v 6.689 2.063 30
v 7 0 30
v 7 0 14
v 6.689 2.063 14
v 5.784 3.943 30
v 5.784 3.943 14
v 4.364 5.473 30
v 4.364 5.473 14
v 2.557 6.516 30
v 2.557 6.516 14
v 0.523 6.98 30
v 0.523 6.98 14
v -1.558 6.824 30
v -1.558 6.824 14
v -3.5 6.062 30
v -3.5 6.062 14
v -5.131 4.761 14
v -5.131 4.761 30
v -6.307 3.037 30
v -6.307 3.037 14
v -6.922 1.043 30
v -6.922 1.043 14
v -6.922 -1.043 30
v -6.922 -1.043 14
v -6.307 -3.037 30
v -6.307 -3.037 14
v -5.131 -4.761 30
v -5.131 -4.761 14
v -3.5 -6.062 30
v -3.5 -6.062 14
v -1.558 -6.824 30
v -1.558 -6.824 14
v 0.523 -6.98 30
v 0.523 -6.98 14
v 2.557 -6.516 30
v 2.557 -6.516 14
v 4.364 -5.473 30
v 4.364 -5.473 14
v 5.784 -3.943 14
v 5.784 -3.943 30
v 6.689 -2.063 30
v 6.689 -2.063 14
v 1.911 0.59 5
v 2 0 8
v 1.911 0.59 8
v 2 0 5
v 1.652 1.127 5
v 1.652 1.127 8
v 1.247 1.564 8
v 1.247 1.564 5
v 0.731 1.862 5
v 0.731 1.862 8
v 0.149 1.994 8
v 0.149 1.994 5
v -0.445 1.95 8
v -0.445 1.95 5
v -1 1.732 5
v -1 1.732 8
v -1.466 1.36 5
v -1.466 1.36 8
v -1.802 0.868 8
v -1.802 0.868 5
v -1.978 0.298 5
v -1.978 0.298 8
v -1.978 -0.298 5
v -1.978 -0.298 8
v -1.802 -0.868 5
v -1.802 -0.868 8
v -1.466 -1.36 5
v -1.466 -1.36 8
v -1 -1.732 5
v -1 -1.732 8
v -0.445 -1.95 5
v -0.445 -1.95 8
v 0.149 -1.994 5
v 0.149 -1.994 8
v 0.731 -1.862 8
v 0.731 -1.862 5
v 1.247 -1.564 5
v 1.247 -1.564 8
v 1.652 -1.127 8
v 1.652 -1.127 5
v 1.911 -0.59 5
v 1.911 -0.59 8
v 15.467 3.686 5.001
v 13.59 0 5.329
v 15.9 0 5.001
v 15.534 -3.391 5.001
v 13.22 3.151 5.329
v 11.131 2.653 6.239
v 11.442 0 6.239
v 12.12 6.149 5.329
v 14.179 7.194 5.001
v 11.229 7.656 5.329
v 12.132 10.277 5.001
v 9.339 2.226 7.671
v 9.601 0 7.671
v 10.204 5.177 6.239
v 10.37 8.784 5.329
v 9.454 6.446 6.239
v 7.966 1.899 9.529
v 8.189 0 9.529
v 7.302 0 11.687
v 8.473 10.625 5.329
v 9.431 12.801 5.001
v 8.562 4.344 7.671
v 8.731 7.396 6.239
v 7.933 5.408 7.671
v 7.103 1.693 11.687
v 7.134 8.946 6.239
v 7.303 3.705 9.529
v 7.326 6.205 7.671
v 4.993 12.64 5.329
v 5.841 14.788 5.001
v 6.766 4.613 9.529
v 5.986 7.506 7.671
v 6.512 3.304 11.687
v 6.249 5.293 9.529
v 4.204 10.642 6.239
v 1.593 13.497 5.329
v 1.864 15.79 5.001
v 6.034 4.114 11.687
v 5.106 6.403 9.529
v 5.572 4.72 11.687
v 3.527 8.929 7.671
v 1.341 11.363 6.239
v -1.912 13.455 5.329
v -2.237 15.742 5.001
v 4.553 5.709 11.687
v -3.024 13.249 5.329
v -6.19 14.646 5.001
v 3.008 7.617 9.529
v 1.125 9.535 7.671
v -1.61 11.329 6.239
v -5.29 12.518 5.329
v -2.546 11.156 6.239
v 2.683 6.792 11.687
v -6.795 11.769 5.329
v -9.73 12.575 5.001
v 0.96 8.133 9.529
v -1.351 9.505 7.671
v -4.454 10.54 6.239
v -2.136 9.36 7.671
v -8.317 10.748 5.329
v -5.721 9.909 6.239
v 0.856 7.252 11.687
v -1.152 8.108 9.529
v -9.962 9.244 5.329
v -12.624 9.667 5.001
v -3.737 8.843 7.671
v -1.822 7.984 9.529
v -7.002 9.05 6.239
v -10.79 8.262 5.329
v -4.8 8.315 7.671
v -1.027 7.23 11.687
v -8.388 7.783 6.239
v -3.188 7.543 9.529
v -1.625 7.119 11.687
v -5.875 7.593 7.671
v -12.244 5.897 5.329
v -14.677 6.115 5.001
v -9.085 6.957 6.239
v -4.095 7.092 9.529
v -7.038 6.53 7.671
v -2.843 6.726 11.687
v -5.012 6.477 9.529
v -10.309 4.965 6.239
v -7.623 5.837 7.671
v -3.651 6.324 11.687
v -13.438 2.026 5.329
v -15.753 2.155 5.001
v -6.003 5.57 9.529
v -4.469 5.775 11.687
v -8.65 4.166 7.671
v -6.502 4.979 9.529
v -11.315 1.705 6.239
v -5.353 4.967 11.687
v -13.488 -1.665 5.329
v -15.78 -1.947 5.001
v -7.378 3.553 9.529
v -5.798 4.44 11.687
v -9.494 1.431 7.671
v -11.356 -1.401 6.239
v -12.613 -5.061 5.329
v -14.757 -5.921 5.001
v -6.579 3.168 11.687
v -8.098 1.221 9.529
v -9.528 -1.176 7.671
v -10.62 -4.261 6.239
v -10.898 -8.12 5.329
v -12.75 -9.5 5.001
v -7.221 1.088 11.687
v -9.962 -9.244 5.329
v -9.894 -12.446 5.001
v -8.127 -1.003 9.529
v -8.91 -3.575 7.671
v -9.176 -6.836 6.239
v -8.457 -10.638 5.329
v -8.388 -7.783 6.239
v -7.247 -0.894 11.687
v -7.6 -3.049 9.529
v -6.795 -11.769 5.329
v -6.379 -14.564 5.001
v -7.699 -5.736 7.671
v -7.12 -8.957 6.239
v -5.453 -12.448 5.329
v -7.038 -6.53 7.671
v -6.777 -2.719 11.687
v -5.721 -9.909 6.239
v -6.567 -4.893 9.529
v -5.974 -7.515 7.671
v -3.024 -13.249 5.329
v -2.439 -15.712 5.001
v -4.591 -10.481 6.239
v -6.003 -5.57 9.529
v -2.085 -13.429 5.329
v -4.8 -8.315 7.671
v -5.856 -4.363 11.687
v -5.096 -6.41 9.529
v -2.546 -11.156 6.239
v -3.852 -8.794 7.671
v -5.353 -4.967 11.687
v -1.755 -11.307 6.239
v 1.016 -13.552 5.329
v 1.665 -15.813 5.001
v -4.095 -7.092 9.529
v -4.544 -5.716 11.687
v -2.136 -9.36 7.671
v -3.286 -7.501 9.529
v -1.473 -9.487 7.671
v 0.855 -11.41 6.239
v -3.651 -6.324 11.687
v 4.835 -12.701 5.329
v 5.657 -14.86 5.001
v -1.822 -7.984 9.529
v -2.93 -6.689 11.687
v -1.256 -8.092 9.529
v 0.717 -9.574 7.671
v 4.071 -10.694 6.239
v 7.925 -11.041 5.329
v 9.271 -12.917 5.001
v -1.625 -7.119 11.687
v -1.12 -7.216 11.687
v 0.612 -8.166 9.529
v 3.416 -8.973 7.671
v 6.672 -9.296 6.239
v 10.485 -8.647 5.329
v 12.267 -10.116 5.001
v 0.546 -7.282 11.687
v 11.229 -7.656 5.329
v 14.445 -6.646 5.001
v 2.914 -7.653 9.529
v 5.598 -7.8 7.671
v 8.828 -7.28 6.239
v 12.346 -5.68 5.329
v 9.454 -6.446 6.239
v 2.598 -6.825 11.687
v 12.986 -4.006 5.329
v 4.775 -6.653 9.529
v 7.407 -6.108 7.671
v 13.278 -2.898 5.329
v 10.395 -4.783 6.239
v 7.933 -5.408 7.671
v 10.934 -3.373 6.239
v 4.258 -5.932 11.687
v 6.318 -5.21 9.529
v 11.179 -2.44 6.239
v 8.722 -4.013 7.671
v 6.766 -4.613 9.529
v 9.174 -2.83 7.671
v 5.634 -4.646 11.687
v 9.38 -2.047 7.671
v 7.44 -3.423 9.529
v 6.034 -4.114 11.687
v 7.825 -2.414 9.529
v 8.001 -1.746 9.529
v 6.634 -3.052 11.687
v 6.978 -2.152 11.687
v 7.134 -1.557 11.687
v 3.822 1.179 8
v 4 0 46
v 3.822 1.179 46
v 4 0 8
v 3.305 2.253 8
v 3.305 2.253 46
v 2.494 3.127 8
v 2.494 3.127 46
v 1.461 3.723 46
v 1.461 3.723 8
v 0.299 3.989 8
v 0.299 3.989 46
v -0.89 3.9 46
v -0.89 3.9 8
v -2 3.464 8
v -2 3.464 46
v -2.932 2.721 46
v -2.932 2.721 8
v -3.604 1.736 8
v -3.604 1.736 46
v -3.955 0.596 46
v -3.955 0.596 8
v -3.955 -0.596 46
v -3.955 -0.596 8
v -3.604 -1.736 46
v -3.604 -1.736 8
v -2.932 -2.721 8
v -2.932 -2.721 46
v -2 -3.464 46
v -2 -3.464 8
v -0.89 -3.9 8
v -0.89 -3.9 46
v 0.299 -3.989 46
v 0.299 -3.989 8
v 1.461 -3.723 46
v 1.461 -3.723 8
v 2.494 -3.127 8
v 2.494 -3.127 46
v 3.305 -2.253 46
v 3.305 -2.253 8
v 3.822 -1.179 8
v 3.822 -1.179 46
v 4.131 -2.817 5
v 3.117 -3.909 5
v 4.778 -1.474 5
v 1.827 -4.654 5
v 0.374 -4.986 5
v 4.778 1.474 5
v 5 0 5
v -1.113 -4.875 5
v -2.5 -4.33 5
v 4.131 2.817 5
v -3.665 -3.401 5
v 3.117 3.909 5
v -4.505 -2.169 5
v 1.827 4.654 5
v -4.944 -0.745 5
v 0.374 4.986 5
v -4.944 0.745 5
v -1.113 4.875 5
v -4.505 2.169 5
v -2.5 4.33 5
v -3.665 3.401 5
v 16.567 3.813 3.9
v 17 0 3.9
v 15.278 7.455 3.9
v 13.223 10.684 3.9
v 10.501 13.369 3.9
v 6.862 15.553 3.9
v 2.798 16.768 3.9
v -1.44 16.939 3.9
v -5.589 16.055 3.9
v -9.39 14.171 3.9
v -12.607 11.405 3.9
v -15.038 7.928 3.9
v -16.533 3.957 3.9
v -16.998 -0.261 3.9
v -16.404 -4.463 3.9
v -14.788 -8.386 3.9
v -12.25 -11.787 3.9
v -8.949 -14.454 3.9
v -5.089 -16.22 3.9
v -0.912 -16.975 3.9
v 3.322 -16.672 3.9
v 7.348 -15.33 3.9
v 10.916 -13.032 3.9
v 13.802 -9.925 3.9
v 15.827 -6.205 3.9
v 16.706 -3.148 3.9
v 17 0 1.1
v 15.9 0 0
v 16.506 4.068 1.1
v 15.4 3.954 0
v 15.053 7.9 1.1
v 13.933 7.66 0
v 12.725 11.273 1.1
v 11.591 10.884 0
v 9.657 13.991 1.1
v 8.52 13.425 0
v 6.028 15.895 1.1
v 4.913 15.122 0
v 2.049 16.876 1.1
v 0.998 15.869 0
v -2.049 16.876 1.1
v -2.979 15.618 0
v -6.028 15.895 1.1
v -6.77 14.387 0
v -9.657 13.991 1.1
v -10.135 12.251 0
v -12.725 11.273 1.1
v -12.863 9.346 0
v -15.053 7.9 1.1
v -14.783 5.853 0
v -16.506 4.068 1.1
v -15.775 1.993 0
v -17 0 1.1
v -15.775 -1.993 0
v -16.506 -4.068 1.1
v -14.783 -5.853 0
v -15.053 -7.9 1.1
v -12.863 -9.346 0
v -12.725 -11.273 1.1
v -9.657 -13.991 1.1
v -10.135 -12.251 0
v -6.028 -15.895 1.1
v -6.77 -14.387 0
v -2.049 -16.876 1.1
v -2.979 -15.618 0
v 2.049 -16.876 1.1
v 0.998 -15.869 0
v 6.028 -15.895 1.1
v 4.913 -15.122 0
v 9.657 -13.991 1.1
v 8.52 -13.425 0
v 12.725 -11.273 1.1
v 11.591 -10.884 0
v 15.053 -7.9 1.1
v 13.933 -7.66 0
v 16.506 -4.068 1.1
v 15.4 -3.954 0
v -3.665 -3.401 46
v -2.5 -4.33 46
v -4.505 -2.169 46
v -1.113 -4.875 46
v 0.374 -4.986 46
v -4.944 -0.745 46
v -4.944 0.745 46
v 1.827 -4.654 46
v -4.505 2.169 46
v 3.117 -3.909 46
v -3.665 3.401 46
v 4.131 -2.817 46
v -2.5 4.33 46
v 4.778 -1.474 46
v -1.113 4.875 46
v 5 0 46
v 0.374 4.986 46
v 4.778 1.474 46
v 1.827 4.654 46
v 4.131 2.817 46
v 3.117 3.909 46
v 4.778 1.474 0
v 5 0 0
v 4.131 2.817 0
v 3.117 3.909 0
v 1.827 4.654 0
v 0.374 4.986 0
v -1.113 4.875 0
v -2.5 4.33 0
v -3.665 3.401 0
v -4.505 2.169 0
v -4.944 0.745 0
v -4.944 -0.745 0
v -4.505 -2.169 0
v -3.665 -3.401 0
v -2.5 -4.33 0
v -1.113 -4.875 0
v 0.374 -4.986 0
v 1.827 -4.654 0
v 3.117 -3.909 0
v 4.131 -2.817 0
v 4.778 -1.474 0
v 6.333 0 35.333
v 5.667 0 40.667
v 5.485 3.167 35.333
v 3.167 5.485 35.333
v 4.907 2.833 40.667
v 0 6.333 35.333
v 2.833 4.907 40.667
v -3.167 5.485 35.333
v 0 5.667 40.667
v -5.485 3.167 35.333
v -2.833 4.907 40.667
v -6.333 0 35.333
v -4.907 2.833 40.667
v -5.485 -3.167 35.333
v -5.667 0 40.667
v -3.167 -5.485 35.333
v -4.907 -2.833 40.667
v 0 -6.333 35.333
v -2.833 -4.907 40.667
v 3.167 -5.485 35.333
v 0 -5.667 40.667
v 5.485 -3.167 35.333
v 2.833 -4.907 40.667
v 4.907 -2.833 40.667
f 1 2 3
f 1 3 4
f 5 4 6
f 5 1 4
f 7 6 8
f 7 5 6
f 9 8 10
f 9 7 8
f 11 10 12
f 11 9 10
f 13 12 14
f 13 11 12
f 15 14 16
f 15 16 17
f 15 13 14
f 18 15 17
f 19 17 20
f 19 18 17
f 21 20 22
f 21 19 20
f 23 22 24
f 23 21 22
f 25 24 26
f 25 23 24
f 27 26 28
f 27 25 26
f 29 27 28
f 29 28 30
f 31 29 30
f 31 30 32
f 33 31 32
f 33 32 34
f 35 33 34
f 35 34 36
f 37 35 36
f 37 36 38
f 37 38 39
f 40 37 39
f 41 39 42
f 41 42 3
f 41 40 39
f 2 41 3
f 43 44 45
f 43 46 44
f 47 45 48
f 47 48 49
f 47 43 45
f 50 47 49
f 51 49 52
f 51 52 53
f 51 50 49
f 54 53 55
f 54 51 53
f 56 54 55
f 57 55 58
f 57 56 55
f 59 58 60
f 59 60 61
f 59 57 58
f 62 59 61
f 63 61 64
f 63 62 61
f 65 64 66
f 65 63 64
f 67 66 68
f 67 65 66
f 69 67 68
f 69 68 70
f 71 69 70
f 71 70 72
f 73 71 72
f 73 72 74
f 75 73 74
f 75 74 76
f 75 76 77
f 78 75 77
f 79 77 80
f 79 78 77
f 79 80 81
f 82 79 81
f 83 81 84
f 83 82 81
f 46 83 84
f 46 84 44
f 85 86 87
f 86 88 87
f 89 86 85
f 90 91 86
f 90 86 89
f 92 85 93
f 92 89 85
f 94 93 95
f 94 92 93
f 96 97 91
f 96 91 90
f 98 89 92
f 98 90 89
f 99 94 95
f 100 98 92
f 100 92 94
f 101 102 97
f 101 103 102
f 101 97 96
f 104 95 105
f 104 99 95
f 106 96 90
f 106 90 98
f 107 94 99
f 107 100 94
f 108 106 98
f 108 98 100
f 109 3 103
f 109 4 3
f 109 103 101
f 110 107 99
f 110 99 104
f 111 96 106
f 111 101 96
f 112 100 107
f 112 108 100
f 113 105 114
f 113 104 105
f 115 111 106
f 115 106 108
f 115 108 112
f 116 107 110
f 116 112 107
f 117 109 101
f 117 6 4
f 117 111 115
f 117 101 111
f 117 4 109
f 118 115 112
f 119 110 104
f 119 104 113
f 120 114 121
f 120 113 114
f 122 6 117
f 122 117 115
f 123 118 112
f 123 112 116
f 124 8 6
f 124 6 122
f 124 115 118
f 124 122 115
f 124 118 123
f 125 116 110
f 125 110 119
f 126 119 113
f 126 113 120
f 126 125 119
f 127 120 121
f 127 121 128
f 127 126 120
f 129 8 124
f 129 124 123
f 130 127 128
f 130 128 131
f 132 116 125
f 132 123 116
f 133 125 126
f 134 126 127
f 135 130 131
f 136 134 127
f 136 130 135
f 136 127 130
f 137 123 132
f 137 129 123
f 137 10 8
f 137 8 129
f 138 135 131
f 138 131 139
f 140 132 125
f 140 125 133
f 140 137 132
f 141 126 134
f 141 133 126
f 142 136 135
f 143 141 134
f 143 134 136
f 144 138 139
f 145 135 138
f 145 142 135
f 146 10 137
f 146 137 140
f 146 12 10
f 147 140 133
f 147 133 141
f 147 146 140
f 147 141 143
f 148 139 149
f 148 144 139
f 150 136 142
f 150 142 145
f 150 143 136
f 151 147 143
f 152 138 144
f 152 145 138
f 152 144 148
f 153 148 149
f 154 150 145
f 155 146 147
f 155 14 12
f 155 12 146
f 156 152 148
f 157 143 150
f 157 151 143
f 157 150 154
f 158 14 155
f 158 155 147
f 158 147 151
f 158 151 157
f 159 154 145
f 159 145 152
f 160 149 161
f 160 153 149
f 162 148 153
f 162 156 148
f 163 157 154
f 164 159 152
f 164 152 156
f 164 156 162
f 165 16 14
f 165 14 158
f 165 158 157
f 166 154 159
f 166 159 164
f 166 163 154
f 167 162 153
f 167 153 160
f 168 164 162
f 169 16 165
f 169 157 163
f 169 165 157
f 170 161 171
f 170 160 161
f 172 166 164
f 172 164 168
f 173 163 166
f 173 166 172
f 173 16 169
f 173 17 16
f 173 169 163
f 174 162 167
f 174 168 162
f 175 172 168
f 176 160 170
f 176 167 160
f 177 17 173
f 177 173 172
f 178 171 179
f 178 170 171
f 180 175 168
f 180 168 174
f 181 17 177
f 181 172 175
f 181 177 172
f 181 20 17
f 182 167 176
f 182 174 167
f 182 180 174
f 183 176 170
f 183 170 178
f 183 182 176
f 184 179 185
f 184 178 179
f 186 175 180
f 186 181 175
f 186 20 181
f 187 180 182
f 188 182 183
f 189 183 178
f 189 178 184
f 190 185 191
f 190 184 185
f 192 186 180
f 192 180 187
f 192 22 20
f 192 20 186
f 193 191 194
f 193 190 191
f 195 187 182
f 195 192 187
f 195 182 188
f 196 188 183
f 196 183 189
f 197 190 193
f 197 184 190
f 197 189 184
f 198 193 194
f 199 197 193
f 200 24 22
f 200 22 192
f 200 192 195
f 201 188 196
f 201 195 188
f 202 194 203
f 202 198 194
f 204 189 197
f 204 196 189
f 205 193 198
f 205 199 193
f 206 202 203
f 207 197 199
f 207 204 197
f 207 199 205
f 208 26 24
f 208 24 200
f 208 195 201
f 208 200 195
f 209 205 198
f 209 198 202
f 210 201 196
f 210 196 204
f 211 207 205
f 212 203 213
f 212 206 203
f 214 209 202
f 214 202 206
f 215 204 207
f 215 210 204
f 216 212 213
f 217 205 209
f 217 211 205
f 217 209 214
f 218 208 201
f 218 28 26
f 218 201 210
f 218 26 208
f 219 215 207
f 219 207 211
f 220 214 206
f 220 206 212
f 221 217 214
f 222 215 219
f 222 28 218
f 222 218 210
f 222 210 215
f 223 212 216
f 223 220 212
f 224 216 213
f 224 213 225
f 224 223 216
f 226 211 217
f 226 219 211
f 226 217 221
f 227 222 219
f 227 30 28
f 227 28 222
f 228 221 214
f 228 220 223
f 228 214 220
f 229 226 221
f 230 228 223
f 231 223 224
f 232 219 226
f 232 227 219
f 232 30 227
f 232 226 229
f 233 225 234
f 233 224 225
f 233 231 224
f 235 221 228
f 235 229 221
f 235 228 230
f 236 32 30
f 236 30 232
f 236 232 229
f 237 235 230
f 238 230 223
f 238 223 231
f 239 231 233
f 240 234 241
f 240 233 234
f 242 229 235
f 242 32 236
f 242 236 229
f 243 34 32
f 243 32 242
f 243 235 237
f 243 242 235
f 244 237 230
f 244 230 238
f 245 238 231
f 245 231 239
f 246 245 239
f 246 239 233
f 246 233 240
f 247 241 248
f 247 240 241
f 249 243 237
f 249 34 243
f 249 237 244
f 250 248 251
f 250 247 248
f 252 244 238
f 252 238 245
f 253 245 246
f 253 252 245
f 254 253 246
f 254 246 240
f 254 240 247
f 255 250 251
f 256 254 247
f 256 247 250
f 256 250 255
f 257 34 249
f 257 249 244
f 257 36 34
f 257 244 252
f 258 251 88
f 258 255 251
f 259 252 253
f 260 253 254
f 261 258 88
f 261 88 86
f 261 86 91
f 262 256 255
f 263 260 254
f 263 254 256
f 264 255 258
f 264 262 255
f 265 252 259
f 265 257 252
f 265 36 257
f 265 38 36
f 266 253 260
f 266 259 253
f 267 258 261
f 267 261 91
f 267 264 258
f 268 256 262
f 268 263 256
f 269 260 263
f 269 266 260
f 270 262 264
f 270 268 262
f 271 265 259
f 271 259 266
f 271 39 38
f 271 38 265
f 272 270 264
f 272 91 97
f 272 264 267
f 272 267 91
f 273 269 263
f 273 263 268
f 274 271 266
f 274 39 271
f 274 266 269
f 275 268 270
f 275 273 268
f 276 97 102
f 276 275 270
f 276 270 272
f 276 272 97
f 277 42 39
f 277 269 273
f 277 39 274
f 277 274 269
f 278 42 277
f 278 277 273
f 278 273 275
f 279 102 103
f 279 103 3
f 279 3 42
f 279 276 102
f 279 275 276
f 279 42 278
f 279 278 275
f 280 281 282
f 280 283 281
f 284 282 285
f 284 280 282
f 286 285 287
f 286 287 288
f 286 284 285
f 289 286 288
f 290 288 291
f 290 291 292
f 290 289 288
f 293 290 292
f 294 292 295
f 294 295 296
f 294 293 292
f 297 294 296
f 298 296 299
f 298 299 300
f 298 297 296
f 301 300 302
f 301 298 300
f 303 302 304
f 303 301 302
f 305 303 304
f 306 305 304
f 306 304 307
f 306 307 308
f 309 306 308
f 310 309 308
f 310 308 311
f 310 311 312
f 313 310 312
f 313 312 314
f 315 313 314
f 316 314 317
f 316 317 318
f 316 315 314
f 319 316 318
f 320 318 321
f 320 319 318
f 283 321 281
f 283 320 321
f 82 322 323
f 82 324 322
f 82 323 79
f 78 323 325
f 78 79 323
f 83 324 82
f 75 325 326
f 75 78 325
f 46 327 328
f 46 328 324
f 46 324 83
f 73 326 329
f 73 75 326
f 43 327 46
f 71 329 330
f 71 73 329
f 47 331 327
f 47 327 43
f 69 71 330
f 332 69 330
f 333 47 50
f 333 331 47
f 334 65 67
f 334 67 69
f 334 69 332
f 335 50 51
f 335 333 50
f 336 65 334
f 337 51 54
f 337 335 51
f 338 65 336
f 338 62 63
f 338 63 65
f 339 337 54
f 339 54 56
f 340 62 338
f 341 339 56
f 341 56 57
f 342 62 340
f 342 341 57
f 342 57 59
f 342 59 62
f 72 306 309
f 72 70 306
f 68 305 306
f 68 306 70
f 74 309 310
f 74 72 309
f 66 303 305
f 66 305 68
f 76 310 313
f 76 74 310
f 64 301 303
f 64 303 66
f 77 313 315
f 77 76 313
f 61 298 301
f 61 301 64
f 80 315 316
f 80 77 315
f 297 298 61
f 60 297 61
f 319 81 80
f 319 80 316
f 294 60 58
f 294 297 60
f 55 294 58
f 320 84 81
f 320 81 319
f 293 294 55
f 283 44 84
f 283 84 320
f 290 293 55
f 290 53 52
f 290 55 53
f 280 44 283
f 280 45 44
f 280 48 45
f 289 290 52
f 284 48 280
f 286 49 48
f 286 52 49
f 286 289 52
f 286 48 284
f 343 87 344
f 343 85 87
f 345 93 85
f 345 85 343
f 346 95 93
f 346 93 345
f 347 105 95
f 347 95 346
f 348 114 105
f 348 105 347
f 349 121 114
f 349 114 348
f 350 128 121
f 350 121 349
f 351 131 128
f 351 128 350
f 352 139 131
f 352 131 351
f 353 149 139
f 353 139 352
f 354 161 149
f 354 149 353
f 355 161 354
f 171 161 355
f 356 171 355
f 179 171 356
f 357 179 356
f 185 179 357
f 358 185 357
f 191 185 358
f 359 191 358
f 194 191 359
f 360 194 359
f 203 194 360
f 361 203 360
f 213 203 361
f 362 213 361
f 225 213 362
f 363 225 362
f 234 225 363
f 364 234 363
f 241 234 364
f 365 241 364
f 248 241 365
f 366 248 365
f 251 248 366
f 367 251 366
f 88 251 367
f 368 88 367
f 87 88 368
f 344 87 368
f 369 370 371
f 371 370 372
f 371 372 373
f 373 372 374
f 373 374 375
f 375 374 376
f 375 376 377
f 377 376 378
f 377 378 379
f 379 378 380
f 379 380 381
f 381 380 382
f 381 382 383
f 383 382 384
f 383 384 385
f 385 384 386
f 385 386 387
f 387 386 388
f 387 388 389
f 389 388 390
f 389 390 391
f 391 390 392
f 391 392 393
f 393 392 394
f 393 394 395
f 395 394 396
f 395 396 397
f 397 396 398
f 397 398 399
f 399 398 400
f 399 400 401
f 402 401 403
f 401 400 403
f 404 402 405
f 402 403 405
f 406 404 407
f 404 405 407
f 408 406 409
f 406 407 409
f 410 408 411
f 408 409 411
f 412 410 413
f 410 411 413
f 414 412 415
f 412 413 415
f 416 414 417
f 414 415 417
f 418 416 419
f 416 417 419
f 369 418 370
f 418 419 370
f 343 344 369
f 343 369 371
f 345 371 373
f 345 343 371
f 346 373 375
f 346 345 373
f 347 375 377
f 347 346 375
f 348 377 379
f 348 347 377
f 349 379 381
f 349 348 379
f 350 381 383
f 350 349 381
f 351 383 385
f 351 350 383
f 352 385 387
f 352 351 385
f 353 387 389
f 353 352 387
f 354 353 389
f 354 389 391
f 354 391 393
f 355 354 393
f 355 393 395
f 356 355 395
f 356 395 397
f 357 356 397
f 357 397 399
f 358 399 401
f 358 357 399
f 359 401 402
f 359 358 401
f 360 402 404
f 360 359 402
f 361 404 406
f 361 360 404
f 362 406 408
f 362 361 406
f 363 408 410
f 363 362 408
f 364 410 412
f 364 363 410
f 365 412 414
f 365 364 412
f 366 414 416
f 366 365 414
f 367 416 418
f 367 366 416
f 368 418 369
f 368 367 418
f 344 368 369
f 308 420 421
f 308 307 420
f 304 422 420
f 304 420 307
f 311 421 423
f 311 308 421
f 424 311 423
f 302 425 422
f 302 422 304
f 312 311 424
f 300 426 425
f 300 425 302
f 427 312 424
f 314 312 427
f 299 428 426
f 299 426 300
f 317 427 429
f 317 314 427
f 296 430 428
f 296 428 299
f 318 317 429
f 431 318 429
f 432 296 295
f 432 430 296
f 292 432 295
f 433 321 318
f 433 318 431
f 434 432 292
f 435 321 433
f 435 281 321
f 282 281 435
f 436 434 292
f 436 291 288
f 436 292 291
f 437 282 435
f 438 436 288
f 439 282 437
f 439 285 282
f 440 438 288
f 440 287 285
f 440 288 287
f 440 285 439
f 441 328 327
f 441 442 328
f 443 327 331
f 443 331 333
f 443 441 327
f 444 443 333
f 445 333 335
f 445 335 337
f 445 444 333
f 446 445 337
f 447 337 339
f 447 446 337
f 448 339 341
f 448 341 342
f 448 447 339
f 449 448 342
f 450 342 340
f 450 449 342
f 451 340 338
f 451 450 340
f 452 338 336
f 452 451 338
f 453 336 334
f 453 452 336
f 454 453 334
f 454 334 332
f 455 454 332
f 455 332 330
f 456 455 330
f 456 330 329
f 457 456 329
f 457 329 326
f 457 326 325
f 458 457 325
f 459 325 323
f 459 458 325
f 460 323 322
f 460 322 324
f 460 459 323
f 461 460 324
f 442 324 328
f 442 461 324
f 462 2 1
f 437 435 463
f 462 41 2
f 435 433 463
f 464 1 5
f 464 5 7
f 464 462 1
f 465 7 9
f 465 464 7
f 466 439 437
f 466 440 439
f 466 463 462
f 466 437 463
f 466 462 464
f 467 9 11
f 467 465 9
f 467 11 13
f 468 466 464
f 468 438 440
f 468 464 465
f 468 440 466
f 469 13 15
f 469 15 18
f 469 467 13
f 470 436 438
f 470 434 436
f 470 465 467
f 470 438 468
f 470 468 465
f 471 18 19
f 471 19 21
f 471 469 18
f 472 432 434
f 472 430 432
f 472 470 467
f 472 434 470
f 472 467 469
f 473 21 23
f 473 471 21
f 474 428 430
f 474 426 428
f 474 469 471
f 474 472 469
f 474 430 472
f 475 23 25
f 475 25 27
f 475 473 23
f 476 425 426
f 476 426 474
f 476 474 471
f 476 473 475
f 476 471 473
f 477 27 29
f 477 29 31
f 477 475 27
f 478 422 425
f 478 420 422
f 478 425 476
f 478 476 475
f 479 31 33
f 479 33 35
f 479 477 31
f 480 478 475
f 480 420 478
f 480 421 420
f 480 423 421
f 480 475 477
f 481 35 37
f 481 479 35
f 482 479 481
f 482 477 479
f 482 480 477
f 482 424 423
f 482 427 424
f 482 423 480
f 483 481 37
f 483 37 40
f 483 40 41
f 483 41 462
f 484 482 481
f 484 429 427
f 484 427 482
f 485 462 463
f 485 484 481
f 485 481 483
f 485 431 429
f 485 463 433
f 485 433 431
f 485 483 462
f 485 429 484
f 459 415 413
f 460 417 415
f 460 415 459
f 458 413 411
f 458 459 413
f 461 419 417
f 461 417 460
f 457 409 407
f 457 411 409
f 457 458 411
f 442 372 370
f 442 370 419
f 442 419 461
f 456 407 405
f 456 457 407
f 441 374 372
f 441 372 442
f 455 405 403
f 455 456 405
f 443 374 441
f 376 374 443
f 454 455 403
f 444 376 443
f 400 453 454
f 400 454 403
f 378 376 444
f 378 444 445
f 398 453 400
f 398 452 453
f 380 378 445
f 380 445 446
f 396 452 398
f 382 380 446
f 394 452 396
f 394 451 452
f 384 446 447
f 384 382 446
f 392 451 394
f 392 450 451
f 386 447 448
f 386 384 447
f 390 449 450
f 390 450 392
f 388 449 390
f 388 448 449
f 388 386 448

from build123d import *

# Parameters (mm, degrees)
FILLET_R     = 9
CHAMFER_SIZE = 1.1


with BuildPart() as part:
    # Sketch → Revolution (revolve)
    with BuildSketch(Plane.XZ):
        Polygon((4, 46), (4, 8), (2, 8), (2, 5), (5, 5), (5, 0), (17, 0), (17, 5), (7, 5), (7, 30), (5, 46), align=None)
    revolve(axis=Axis((0, 0, 0), (0, 0, 1)))

    # Fillet
    fillet_edges = [part.edges().sort_by_distance(p)[0] for p in [
        (-7, 0, 5),
    ]]
    fillet(fillet_edges, radius=FILLET_R)

    # Chamfer
    chamfer_edges = [part.edges().sort_by_distance(p)[0] for p in [
        (-17, 0, 5),
        (-17, 0, 0),
    ]]
    chamfer(chamfer_edges, length=CHAMFER_SIZE)


solid = part.part
